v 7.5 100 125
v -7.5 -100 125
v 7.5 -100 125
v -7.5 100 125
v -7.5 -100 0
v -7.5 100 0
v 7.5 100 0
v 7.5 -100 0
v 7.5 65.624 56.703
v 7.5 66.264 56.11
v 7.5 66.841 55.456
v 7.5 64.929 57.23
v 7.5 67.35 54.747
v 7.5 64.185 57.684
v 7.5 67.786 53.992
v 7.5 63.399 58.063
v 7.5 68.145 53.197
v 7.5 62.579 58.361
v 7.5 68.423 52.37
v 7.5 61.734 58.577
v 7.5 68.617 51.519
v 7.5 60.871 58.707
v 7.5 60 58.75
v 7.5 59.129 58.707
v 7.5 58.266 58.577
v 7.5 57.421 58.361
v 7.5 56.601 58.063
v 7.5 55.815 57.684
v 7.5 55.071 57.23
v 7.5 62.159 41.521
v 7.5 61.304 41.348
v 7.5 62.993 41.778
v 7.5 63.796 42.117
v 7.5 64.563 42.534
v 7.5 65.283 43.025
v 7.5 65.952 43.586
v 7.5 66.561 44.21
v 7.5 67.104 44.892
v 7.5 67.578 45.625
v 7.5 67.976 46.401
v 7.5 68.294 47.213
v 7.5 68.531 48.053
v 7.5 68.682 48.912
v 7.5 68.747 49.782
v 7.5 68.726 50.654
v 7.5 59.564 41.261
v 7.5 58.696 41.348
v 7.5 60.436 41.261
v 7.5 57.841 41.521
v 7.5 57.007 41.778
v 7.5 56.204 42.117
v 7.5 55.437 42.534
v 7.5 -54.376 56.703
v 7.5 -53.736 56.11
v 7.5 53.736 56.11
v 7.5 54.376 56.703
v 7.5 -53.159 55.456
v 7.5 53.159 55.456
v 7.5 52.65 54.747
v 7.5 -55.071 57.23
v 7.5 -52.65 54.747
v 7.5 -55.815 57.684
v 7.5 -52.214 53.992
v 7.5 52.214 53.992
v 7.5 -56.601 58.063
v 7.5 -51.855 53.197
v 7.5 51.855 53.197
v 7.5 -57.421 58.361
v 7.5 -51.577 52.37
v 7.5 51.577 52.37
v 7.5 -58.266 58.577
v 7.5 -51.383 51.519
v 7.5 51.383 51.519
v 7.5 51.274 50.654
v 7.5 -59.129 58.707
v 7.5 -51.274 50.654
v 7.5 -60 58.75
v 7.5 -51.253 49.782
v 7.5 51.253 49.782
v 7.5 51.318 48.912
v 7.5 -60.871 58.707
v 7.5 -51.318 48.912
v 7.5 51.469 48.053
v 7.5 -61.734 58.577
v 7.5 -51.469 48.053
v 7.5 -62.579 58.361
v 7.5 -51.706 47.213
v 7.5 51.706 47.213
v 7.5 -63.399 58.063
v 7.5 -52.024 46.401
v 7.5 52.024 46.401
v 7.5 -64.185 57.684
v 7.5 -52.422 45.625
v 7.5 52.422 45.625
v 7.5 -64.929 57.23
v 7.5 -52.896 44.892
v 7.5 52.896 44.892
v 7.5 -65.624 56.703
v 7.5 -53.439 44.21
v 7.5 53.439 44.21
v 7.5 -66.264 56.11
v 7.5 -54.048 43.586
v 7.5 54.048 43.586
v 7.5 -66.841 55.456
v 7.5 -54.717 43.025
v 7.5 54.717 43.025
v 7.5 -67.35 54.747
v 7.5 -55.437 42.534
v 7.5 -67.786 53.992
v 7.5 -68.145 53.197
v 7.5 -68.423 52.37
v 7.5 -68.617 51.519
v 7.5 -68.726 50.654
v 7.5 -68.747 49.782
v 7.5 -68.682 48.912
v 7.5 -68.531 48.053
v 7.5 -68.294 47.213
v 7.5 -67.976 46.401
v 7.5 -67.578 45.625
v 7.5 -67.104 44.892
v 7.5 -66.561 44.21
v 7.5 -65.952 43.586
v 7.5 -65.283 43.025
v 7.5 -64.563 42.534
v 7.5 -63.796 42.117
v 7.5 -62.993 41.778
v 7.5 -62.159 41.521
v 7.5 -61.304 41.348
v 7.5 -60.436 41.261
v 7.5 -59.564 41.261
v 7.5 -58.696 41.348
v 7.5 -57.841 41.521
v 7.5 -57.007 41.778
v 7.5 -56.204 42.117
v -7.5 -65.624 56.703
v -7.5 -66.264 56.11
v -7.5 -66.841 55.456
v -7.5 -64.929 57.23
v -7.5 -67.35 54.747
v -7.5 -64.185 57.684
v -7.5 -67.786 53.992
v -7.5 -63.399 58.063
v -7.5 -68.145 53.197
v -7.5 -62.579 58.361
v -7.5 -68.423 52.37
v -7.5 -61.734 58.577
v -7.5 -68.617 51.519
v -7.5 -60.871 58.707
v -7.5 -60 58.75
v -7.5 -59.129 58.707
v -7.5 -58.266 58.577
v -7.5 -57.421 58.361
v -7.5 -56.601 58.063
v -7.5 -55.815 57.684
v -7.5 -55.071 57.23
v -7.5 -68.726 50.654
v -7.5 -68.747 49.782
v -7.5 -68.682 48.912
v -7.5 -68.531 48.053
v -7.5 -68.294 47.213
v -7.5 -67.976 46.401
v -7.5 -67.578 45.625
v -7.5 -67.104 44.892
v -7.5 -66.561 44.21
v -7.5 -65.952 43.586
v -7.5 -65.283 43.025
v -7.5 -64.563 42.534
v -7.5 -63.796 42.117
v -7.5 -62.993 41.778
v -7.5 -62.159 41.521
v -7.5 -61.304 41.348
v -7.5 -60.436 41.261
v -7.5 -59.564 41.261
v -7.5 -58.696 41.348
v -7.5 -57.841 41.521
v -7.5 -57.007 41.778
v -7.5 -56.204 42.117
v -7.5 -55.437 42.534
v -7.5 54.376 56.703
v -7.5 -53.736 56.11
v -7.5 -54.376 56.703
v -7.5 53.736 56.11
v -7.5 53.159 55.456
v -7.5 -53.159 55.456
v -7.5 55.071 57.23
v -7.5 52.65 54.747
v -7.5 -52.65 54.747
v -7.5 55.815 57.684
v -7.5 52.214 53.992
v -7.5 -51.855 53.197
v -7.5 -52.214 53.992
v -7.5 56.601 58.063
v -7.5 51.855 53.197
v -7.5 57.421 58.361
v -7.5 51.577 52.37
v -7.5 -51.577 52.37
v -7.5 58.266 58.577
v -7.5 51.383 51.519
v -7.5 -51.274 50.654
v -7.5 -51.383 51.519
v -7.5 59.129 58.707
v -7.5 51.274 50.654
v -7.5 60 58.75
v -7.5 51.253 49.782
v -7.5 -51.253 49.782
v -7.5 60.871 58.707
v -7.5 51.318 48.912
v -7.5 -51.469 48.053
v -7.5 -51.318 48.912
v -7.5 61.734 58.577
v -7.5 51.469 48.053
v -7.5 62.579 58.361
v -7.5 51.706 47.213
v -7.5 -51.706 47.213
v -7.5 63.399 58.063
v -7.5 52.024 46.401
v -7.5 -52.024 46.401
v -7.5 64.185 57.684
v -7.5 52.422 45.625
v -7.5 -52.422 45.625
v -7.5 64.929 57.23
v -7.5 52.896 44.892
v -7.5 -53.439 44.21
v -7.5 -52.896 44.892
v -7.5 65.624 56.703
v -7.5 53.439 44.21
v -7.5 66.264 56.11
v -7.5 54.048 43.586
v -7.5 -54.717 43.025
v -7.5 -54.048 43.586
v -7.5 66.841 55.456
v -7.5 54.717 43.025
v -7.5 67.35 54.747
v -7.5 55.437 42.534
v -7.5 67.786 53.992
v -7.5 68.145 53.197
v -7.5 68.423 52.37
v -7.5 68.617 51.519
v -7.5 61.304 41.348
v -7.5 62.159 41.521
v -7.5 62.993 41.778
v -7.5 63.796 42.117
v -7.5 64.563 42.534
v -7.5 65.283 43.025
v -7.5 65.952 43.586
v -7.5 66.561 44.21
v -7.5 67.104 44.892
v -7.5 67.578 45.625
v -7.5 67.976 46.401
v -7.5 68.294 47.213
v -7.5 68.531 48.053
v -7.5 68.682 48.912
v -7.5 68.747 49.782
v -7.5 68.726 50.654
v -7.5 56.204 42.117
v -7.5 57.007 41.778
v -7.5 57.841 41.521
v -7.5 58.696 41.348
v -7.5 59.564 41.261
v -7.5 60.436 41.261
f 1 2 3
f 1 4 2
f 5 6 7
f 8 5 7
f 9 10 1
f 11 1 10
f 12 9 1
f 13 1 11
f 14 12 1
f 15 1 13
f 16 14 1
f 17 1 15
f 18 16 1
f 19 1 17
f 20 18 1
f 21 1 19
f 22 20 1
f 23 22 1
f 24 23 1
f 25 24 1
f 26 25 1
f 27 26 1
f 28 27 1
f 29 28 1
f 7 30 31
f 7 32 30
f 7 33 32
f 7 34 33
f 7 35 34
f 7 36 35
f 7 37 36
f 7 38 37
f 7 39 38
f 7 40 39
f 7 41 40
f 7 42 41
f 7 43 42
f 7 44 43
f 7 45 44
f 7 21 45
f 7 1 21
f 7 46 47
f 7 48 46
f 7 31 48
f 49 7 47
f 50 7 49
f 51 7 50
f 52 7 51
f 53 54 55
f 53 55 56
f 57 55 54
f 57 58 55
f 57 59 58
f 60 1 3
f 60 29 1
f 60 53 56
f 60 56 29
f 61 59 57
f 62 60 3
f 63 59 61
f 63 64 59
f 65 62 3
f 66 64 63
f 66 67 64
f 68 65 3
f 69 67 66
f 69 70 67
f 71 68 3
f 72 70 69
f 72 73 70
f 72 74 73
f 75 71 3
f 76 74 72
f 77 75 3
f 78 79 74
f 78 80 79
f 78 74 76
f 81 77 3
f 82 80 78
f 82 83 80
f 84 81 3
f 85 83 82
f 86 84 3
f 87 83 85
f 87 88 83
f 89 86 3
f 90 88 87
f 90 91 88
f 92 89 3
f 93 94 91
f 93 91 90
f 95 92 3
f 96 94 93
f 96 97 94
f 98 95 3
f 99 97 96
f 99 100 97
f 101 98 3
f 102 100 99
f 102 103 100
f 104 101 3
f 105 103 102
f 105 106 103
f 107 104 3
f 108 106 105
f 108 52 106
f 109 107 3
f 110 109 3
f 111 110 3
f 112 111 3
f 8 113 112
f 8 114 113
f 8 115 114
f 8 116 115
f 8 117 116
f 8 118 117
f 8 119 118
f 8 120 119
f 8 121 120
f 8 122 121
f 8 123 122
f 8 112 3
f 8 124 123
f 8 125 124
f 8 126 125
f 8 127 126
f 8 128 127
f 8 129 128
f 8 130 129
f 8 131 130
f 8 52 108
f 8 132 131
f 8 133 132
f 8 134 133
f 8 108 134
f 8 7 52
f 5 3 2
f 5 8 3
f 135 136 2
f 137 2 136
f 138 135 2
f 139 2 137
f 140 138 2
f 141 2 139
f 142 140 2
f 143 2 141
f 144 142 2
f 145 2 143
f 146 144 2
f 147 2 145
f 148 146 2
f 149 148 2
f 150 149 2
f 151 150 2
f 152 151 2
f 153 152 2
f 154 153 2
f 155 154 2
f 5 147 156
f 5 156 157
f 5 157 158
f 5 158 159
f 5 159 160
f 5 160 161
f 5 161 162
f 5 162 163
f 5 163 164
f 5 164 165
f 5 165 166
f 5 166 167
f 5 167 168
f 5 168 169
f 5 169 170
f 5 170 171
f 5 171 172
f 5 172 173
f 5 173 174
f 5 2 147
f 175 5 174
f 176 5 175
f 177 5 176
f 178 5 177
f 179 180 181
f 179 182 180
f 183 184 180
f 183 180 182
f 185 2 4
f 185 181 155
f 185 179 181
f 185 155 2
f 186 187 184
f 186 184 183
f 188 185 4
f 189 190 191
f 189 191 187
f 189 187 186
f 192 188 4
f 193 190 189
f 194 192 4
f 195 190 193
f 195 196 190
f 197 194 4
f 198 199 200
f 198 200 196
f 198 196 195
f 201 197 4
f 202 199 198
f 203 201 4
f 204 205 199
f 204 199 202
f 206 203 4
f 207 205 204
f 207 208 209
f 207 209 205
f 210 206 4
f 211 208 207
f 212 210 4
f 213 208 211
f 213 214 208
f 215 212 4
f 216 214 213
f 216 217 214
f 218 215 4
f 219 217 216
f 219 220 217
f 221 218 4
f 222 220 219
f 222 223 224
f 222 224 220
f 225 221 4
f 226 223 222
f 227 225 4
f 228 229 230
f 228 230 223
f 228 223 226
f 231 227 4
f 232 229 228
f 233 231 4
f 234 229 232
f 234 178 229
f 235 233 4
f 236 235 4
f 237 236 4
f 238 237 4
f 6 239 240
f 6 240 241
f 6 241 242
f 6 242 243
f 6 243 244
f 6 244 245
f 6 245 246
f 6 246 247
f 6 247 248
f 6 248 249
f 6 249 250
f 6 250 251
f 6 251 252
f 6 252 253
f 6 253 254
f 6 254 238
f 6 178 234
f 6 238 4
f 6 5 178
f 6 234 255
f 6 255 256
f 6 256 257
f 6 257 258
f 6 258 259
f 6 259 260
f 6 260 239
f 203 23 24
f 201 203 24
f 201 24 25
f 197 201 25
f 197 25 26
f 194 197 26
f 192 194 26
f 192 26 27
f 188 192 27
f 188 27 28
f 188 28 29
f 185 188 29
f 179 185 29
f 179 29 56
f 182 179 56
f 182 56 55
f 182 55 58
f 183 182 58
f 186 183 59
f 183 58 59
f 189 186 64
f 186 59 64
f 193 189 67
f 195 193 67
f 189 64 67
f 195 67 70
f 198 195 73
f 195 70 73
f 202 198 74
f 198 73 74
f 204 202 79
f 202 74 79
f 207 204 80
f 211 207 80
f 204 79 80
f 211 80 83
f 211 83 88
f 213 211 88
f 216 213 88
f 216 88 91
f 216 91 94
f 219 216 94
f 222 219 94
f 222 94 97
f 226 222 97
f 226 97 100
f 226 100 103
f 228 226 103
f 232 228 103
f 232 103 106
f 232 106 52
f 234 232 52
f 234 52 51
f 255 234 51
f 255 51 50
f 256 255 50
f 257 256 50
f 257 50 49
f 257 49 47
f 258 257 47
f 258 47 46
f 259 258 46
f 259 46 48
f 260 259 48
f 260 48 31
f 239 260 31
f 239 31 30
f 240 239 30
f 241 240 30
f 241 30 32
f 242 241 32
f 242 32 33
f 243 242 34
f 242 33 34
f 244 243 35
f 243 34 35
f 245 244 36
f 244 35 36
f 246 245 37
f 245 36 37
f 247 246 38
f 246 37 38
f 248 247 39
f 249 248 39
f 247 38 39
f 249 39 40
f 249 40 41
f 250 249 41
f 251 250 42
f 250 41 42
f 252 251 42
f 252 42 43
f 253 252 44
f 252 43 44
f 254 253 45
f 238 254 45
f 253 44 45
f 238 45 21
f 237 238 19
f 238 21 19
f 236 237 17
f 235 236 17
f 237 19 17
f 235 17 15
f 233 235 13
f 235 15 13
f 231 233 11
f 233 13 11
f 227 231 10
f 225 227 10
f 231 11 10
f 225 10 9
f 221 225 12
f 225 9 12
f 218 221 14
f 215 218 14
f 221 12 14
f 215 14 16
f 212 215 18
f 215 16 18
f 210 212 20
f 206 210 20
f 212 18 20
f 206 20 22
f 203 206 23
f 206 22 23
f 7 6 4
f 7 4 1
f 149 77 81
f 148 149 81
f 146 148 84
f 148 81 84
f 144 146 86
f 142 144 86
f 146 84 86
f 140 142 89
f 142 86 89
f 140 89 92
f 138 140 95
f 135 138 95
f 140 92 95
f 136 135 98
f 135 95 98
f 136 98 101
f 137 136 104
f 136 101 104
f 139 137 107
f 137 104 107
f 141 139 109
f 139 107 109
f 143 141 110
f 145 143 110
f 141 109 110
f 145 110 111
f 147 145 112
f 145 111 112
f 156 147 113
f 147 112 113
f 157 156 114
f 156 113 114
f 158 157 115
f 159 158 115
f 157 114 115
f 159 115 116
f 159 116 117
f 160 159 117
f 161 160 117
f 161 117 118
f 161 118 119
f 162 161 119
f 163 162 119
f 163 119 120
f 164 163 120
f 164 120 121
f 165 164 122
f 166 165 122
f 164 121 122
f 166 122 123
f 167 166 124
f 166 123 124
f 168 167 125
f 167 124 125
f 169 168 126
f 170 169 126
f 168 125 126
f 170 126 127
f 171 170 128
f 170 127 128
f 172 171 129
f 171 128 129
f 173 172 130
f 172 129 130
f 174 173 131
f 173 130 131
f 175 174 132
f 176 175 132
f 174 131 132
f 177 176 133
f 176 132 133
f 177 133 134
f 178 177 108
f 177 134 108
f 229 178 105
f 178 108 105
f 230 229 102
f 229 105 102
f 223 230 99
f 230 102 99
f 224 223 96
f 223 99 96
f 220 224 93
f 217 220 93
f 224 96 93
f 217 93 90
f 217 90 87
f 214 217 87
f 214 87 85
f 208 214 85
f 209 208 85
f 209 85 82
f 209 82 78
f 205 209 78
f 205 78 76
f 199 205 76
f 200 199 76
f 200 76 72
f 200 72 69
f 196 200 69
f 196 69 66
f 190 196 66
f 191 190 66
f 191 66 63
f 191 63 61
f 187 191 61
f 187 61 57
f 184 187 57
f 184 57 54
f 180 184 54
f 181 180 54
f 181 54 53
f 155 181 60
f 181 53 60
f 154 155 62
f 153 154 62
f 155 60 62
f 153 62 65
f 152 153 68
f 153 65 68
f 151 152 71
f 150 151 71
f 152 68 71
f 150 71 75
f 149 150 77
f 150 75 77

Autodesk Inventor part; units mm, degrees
ref_plane "YZ Plane" through (0, 0, 0) normal (1, 0, 0) x (0, 1, 0)
ref_plane "Start Plane" through (0, 0, 0) normal (0, 0, 1) x (1, 0, 0)
ref_plane "End Plane" through (0, 0, 125) normal (0, 0, 1) x (1, 0, 0)
sketch "Sketch" plane through (0, 0, 0) normal (0, 0, 1) x (1, 0, 0)
  line L0 (7.5, -100) -> (-7.5, -100)
  line L1 (-7.5, -100) -> (-7.5, 100)
  line L2 (-7.5, 100) -> (7.5, 100)
  line L3 (7.5, 100) -> (7.5, -100)
  line L4 (-6, 0) -> (8, 0) construction
  line L5 (0, -30) -> (0, 40) construction
  line L6 (0, 140) -> (0, -140) construction
  line L7 (-11, 0) -> (13.5, 0) construction
  dimension "d0" = 200
  dimension "d1" = 15
  dimension "d4" = 7.5
  dimension "d5" = 100
extrude "Body" add sketch "Sketch" along normal up to surface (125 mm away) from surface at 0
sketch "Sketch3" plane through (0, 0, 0) normal (0, 0, 1) x (1, 0, 0)
  line L0 (0, 0) -> (10, 0)
ref_plane "Work Plane3" through (0, 0, 0) normal (0, -1, 0) x (1, 0, 0)
sketch "Sketch5" plane through (-7.5, 100, 0) normal (-1, 0, 0) x (0, 0, 1)
  point P0 (50, -40)
hole "Hole1" at (-7.5, 60, 50) direction (1, 0, 0) diameter 17.5 end through all
sketch "Sketch6" plane through (-7.5, 100, 0) normal (-1, 0, 0) x (0, 0, 1)
  point P0 (50, -160)
hole "Hole2" at (-7.5, -60, 50) direction (1, 0, 0) diameter 17.5 end through all
sketch "Sketch4" plane through (0, 0, 0) normal (0, -1, 0) x (1, 0, 0)
  line L0 (-2, 0) -> (12, 0) projected
  line L1 (-2, 125) -> (12, 125) projected
  dimension "d9" = 125
equation "\"d0\" = G_W"
equation "\"d1\" = G_H"
equation "\"d4\" = 0.5 * d1"
equation "\"d5\" = 0.5 * d0"
equation "\"d2\" = G_L"
equation "\"G_W\" = 200"
equation "\"G_H\" = 15"
equation "\"G_L\" = d9"
equation "\"G_OFFSET_START\" = 0"
equation "\"G_OFFSET_END\" = 0"
equation "\"d7\" = G_OFFSET_END + B_L"
equation "\"B_L\" = 125"
properties part number "DIN EN 10278 - 200 x 15 - 125" material "Steel, Mild"
